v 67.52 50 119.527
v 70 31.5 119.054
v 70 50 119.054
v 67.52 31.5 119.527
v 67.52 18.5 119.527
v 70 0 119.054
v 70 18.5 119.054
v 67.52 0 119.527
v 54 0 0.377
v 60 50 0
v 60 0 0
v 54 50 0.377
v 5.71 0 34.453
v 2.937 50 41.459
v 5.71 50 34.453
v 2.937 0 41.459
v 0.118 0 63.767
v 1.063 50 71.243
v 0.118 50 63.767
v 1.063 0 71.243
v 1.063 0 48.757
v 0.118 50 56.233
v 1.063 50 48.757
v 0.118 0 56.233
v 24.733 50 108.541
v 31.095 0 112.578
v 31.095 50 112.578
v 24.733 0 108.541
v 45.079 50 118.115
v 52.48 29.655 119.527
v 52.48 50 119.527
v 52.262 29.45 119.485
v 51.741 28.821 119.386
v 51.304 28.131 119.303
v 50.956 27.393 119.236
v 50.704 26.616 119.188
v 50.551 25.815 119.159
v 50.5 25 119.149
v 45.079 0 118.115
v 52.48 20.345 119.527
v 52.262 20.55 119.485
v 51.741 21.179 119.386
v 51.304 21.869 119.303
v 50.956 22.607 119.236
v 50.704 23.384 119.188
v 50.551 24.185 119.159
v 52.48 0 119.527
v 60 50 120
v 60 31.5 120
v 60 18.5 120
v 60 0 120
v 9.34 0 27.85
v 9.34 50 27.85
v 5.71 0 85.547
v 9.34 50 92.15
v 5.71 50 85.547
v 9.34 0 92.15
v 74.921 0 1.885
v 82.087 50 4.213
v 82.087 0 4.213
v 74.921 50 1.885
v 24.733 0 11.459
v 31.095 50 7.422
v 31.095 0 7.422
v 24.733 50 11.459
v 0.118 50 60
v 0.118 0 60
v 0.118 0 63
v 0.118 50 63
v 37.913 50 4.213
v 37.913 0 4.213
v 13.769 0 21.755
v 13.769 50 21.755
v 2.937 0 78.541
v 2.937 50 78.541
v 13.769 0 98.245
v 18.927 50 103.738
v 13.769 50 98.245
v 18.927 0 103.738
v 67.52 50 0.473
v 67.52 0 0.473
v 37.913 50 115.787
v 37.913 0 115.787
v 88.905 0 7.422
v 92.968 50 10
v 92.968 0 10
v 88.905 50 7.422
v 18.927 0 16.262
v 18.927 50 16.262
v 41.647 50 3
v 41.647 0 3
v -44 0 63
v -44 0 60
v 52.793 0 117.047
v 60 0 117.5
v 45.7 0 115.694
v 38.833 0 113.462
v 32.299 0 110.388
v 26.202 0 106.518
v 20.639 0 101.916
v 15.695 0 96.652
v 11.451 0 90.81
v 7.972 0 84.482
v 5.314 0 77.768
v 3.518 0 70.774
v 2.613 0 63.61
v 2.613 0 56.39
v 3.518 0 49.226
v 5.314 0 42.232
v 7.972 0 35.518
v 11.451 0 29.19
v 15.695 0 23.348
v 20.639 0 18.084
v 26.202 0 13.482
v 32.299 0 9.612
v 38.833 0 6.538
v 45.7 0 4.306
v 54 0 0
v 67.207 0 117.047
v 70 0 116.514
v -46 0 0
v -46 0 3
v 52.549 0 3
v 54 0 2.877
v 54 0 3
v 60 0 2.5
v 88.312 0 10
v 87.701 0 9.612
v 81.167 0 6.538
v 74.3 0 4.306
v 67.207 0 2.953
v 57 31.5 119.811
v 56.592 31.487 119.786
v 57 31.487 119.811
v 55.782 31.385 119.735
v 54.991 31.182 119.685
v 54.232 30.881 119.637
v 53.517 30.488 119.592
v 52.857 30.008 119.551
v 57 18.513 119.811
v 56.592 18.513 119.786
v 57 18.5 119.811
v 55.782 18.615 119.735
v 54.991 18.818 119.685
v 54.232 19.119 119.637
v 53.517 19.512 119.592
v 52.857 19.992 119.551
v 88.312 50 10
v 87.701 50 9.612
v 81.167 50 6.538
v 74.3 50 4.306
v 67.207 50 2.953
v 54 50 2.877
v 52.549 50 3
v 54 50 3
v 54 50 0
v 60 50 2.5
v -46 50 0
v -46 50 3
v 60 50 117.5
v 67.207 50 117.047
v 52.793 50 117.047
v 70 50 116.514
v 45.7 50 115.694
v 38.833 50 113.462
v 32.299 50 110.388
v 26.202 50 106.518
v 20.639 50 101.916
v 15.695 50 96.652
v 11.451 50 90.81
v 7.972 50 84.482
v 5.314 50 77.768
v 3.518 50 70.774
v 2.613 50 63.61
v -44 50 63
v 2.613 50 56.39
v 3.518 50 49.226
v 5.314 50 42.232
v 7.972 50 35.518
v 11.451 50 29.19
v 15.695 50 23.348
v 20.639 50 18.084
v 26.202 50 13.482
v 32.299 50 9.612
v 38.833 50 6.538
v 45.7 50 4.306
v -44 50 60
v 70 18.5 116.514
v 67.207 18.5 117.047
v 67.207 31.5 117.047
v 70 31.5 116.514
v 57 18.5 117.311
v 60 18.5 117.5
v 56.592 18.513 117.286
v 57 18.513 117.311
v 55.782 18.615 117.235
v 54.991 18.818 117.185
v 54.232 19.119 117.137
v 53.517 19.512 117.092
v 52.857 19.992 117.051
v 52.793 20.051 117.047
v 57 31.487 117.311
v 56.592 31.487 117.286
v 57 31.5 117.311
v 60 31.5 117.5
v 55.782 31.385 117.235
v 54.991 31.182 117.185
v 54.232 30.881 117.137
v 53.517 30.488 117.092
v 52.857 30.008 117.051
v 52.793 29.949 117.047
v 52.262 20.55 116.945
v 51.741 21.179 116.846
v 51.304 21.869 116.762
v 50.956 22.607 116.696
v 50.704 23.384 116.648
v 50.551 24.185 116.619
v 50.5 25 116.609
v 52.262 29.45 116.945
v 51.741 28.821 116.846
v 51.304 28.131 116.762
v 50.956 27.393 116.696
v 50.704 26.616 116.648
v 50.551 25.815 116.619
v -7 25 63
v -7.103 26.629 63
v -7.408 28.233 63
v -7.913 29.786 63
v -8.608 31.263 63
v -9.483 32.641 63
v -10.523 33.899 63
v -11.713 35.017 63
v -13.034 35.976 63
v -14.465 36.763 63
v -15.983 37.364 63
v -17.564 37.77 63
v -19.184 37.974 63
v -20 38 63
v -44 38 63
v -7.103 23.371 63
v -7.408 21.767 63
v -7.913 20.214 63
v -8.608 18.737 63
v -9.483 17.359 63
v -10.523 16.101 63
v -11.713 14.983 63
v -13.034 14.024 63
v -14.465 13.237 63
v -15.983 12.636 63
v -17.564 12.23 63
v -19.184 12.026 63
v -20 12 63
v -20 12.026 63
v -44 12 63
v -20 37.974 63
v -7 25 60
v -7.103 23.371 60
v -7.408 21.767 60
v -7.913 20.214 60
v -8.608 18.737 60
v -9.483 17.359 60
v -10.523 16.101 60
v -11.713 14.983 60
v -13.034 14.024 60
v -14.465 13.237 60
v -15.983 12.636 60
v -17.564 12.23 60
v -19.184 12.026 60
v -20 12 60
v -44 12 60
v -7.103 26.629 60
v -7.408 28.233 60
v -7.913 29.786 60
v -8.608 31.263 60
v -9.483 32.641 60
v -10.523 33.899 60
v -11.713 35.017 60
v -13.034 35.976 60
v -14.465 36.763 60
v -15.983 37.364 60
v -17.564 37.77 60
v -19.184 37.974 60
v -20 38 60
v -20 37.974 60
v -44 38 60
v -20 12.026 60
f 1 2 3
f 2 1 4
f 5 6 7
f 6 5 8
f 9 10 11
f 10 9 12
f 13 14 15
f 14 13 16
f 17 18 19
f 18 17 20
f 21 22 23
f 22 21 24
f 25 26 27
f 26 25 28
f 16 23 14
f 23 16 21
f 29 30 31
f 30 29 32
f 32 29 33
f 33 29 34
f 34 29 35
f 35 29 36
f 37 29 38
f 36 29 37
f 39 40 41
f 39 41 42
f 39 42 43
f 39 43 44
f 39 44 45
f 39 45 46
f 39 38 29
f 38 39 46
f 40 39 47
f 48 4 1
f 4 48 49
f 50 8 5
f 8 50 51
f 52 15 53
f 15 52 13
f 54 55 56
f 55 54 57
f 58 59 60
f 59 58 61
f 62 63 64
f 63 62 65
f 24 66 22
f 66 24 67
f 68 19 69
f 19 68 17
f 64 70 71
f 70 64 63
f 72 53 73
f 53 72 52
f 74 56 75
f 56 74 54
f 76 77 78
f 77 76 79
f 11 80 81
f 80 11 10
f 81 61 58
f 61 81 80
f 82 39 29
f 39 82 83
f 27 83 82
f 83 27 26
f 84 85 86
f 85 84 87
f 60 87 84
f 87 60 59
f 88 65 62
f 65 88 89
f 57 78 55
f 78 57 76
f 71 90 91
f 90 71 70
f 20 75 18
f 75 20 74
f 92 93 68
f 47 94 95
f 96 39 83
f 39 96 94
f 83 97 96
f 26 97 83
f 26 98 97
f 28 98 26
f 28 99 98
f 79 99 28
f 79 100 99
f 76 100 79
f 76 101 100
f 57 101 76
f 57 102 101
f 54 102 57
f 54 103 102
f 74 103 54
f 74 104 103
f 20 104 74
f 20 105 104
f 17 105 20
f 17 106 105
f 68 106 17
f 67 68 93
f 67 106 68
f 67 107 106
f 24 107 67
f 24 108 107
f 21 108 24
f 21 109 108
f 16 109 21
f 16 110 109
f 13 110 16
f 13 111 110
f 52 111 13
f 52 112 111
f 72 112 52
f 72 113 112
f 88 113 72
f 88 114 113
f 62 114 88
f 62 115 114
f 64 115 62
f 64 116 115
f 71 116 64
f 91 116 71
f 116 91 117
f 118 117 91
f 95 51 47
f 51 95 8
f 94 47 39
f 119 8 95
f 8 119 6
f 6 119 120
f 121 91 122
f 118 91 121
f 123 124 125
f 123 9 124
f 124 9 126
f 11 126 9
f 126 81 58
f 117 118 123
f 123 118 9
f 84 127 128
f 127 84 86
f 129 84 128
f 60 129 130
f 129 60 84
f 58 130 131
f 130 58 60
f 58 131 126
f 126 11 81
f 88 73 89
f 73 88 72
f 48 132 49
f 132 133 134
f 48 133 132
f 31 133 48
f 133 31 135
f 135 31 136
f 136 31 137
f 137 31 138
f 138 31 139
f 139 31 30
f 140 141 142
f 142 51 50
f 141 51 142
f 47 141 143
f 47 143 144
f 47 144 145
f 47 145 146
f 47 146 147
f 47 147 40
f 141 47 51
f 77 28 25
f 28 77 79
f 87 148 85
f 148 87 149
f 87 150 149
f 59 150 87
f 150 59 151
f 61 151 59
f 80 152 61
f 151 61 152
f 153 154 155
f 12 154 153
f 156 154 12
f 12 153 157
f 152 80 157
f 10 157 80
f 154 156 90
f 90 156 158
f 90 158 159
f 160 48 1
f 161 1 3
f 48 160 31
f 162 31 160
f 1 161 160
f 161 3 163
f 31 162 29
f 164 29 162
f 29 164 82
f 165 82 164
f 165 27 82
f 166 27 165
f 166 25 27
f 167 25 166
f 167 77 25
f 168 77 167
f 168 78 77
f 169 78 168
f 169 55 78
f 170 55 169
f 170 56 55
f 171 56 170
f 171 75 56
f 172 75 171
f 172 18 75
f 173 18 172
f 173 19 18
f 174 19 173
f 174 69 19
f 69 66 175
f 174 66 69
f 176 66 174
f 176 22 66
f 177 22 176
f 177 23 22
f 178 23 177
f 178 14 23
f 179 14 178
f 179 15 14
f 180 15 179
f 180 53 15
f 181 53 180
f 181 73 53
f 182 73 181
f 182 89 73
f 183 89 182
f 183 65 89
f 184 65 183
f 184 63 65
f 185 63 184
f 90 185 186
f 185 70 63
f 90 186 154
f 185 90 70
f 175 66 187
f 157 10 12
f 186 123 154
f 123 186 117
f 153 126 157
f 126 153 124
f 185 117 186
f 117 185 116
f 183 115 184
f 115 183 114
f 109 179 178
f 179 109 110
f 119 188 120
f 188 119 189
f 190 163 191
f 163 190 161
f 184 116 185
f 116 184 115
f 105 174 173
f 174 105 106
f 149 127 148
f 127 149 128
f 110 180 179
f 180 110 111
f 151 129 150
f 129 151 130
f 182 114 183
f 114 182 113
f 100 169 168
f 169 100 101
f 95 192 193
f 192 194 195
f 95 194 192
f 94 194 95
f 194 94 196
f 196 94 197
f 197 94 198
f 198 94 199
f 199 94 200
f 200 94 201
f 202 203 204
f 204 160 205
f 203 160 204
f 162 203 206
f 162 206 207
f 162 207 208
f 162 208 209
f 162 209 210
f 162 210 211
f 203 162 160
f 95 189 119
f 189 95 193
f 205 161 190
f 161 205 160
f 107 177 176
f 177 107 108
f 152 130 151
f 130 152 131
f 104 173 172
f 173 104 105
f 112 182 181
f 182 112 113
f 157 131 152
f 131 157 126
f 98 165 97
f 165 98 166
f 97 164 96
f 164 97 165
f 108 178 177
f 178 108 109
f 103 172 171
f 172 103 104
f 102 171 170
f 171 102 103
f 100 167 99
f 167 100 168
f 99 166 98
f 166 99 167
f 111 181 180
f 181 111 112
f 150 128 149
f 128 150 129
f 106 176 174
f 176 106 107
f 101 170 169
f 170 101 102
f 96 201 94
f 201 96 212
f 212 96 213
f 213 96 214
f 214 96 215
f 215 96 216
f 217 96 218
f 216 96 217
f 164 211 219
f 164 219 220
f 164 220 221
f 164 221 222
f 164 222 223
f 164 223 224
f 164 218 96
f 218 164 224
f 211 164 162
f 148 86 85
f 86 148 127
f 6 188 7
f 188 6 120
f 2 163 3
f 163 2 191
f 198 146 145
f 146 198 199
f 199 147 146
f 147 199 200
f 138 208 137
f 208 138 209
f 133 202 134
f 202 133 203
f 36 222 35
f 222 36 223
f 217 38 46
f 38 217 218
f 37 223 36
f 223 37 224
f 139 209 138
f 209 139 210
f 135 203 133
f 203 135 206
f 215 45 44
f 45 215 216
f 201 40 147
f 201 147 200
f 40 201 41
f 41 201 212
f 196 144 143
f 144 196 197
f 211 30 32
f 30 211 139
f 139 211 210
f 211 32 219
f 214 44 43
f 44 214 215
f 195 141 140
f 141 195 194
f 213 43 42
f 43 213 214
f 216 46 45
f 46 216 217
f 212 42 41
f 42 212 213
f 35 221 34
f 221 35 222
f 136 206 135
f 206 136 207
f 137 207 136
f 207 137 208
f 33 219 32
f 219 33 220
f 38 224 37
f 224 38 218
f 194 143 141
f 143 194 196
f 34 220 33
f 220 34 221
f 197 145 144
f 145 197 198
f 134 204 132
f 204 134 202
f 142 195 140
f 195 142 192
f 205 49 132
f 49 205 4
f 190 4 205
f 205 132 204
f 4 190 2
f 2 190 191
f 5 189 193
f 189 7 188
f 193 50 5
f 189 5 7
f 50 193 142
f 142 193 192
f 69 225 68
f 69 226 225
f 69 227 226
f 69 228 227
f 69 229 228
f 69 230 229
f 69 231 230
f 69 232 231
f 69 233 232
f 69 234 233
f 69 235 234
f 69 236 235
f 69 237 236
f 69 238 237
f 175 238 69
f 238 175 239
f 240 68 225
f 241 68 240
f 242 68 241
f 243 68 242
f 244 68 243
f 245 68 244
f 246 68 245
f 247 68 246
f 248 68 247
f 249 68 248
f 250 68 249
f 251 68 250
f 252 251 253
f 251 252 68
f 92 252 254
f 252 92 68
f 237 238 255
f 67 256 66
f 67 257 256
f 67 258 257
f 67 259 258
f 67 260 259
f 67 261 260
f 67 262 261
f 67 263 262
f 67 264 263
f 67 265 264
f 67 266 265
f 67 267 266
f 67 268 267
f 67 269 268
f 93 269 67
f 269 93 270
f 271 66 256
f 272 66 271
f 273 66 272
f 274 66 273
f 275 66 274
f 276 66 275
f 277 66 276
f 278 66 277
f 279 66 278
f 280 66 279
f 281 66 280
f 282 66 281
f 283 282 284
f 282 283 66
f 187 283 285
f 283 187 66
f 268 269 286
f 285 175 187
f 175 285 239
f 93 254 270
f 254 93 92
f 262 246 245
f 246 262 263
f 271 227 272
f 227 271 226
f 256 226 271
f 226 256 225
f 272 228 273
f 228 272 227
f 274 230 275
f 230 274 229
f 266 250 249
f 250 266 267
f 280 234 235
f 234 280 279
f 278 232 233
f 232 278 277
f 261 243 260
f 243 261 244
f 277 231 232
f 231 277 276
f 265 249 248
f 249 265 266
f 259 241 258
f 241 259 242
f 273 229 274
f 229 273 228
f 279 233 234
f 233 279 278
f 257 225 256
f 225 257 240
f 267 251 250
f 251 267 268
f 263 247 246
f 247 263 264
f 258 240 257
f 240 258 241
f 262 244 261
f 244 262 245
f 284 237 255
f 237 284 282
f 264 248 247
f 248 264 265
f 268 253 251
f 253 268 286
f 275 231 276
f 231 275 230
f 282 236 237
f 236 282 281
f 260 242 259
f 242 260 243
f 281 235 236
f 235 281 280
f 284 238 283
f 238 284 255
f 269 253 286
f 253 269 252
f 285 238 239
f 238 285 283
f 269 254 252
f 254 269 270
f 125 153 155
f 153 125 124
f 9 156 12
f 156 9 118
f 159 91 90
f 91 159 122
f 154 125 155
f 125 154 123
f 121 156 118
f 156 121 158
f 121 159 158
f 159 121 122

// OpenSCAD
razordiameter=13;
brushdiameter=26;

 $fn=50;
 translate([60,0,60]) difference(){
   rotate([0,90,90])difference(){
        cylinder(h=50, d=120);
        translate([0,0,-3]) cylinder(h=55, d=115);
    }
    translate([10,-1,-50])cube([120,52,120]);
    translate([-3,25,52])cylinder(h=10, d=razordiameter);
    translate([-3,(50/2)-(razordiameter/2),52])rotate([0,0,0])cube([24,razordiameter,15]);
}
translate([-46,0,0])cube([100,50,3]);
difference(){
    translate([-44,0,60])cube([45,50,3]);
    translate([-20,25,59])cylinder(h=10, d=brushdiameter);
    translate([-50,(50/2)-(brushdiameter/2),59])cube([30,brushdiameter,10]);
}
